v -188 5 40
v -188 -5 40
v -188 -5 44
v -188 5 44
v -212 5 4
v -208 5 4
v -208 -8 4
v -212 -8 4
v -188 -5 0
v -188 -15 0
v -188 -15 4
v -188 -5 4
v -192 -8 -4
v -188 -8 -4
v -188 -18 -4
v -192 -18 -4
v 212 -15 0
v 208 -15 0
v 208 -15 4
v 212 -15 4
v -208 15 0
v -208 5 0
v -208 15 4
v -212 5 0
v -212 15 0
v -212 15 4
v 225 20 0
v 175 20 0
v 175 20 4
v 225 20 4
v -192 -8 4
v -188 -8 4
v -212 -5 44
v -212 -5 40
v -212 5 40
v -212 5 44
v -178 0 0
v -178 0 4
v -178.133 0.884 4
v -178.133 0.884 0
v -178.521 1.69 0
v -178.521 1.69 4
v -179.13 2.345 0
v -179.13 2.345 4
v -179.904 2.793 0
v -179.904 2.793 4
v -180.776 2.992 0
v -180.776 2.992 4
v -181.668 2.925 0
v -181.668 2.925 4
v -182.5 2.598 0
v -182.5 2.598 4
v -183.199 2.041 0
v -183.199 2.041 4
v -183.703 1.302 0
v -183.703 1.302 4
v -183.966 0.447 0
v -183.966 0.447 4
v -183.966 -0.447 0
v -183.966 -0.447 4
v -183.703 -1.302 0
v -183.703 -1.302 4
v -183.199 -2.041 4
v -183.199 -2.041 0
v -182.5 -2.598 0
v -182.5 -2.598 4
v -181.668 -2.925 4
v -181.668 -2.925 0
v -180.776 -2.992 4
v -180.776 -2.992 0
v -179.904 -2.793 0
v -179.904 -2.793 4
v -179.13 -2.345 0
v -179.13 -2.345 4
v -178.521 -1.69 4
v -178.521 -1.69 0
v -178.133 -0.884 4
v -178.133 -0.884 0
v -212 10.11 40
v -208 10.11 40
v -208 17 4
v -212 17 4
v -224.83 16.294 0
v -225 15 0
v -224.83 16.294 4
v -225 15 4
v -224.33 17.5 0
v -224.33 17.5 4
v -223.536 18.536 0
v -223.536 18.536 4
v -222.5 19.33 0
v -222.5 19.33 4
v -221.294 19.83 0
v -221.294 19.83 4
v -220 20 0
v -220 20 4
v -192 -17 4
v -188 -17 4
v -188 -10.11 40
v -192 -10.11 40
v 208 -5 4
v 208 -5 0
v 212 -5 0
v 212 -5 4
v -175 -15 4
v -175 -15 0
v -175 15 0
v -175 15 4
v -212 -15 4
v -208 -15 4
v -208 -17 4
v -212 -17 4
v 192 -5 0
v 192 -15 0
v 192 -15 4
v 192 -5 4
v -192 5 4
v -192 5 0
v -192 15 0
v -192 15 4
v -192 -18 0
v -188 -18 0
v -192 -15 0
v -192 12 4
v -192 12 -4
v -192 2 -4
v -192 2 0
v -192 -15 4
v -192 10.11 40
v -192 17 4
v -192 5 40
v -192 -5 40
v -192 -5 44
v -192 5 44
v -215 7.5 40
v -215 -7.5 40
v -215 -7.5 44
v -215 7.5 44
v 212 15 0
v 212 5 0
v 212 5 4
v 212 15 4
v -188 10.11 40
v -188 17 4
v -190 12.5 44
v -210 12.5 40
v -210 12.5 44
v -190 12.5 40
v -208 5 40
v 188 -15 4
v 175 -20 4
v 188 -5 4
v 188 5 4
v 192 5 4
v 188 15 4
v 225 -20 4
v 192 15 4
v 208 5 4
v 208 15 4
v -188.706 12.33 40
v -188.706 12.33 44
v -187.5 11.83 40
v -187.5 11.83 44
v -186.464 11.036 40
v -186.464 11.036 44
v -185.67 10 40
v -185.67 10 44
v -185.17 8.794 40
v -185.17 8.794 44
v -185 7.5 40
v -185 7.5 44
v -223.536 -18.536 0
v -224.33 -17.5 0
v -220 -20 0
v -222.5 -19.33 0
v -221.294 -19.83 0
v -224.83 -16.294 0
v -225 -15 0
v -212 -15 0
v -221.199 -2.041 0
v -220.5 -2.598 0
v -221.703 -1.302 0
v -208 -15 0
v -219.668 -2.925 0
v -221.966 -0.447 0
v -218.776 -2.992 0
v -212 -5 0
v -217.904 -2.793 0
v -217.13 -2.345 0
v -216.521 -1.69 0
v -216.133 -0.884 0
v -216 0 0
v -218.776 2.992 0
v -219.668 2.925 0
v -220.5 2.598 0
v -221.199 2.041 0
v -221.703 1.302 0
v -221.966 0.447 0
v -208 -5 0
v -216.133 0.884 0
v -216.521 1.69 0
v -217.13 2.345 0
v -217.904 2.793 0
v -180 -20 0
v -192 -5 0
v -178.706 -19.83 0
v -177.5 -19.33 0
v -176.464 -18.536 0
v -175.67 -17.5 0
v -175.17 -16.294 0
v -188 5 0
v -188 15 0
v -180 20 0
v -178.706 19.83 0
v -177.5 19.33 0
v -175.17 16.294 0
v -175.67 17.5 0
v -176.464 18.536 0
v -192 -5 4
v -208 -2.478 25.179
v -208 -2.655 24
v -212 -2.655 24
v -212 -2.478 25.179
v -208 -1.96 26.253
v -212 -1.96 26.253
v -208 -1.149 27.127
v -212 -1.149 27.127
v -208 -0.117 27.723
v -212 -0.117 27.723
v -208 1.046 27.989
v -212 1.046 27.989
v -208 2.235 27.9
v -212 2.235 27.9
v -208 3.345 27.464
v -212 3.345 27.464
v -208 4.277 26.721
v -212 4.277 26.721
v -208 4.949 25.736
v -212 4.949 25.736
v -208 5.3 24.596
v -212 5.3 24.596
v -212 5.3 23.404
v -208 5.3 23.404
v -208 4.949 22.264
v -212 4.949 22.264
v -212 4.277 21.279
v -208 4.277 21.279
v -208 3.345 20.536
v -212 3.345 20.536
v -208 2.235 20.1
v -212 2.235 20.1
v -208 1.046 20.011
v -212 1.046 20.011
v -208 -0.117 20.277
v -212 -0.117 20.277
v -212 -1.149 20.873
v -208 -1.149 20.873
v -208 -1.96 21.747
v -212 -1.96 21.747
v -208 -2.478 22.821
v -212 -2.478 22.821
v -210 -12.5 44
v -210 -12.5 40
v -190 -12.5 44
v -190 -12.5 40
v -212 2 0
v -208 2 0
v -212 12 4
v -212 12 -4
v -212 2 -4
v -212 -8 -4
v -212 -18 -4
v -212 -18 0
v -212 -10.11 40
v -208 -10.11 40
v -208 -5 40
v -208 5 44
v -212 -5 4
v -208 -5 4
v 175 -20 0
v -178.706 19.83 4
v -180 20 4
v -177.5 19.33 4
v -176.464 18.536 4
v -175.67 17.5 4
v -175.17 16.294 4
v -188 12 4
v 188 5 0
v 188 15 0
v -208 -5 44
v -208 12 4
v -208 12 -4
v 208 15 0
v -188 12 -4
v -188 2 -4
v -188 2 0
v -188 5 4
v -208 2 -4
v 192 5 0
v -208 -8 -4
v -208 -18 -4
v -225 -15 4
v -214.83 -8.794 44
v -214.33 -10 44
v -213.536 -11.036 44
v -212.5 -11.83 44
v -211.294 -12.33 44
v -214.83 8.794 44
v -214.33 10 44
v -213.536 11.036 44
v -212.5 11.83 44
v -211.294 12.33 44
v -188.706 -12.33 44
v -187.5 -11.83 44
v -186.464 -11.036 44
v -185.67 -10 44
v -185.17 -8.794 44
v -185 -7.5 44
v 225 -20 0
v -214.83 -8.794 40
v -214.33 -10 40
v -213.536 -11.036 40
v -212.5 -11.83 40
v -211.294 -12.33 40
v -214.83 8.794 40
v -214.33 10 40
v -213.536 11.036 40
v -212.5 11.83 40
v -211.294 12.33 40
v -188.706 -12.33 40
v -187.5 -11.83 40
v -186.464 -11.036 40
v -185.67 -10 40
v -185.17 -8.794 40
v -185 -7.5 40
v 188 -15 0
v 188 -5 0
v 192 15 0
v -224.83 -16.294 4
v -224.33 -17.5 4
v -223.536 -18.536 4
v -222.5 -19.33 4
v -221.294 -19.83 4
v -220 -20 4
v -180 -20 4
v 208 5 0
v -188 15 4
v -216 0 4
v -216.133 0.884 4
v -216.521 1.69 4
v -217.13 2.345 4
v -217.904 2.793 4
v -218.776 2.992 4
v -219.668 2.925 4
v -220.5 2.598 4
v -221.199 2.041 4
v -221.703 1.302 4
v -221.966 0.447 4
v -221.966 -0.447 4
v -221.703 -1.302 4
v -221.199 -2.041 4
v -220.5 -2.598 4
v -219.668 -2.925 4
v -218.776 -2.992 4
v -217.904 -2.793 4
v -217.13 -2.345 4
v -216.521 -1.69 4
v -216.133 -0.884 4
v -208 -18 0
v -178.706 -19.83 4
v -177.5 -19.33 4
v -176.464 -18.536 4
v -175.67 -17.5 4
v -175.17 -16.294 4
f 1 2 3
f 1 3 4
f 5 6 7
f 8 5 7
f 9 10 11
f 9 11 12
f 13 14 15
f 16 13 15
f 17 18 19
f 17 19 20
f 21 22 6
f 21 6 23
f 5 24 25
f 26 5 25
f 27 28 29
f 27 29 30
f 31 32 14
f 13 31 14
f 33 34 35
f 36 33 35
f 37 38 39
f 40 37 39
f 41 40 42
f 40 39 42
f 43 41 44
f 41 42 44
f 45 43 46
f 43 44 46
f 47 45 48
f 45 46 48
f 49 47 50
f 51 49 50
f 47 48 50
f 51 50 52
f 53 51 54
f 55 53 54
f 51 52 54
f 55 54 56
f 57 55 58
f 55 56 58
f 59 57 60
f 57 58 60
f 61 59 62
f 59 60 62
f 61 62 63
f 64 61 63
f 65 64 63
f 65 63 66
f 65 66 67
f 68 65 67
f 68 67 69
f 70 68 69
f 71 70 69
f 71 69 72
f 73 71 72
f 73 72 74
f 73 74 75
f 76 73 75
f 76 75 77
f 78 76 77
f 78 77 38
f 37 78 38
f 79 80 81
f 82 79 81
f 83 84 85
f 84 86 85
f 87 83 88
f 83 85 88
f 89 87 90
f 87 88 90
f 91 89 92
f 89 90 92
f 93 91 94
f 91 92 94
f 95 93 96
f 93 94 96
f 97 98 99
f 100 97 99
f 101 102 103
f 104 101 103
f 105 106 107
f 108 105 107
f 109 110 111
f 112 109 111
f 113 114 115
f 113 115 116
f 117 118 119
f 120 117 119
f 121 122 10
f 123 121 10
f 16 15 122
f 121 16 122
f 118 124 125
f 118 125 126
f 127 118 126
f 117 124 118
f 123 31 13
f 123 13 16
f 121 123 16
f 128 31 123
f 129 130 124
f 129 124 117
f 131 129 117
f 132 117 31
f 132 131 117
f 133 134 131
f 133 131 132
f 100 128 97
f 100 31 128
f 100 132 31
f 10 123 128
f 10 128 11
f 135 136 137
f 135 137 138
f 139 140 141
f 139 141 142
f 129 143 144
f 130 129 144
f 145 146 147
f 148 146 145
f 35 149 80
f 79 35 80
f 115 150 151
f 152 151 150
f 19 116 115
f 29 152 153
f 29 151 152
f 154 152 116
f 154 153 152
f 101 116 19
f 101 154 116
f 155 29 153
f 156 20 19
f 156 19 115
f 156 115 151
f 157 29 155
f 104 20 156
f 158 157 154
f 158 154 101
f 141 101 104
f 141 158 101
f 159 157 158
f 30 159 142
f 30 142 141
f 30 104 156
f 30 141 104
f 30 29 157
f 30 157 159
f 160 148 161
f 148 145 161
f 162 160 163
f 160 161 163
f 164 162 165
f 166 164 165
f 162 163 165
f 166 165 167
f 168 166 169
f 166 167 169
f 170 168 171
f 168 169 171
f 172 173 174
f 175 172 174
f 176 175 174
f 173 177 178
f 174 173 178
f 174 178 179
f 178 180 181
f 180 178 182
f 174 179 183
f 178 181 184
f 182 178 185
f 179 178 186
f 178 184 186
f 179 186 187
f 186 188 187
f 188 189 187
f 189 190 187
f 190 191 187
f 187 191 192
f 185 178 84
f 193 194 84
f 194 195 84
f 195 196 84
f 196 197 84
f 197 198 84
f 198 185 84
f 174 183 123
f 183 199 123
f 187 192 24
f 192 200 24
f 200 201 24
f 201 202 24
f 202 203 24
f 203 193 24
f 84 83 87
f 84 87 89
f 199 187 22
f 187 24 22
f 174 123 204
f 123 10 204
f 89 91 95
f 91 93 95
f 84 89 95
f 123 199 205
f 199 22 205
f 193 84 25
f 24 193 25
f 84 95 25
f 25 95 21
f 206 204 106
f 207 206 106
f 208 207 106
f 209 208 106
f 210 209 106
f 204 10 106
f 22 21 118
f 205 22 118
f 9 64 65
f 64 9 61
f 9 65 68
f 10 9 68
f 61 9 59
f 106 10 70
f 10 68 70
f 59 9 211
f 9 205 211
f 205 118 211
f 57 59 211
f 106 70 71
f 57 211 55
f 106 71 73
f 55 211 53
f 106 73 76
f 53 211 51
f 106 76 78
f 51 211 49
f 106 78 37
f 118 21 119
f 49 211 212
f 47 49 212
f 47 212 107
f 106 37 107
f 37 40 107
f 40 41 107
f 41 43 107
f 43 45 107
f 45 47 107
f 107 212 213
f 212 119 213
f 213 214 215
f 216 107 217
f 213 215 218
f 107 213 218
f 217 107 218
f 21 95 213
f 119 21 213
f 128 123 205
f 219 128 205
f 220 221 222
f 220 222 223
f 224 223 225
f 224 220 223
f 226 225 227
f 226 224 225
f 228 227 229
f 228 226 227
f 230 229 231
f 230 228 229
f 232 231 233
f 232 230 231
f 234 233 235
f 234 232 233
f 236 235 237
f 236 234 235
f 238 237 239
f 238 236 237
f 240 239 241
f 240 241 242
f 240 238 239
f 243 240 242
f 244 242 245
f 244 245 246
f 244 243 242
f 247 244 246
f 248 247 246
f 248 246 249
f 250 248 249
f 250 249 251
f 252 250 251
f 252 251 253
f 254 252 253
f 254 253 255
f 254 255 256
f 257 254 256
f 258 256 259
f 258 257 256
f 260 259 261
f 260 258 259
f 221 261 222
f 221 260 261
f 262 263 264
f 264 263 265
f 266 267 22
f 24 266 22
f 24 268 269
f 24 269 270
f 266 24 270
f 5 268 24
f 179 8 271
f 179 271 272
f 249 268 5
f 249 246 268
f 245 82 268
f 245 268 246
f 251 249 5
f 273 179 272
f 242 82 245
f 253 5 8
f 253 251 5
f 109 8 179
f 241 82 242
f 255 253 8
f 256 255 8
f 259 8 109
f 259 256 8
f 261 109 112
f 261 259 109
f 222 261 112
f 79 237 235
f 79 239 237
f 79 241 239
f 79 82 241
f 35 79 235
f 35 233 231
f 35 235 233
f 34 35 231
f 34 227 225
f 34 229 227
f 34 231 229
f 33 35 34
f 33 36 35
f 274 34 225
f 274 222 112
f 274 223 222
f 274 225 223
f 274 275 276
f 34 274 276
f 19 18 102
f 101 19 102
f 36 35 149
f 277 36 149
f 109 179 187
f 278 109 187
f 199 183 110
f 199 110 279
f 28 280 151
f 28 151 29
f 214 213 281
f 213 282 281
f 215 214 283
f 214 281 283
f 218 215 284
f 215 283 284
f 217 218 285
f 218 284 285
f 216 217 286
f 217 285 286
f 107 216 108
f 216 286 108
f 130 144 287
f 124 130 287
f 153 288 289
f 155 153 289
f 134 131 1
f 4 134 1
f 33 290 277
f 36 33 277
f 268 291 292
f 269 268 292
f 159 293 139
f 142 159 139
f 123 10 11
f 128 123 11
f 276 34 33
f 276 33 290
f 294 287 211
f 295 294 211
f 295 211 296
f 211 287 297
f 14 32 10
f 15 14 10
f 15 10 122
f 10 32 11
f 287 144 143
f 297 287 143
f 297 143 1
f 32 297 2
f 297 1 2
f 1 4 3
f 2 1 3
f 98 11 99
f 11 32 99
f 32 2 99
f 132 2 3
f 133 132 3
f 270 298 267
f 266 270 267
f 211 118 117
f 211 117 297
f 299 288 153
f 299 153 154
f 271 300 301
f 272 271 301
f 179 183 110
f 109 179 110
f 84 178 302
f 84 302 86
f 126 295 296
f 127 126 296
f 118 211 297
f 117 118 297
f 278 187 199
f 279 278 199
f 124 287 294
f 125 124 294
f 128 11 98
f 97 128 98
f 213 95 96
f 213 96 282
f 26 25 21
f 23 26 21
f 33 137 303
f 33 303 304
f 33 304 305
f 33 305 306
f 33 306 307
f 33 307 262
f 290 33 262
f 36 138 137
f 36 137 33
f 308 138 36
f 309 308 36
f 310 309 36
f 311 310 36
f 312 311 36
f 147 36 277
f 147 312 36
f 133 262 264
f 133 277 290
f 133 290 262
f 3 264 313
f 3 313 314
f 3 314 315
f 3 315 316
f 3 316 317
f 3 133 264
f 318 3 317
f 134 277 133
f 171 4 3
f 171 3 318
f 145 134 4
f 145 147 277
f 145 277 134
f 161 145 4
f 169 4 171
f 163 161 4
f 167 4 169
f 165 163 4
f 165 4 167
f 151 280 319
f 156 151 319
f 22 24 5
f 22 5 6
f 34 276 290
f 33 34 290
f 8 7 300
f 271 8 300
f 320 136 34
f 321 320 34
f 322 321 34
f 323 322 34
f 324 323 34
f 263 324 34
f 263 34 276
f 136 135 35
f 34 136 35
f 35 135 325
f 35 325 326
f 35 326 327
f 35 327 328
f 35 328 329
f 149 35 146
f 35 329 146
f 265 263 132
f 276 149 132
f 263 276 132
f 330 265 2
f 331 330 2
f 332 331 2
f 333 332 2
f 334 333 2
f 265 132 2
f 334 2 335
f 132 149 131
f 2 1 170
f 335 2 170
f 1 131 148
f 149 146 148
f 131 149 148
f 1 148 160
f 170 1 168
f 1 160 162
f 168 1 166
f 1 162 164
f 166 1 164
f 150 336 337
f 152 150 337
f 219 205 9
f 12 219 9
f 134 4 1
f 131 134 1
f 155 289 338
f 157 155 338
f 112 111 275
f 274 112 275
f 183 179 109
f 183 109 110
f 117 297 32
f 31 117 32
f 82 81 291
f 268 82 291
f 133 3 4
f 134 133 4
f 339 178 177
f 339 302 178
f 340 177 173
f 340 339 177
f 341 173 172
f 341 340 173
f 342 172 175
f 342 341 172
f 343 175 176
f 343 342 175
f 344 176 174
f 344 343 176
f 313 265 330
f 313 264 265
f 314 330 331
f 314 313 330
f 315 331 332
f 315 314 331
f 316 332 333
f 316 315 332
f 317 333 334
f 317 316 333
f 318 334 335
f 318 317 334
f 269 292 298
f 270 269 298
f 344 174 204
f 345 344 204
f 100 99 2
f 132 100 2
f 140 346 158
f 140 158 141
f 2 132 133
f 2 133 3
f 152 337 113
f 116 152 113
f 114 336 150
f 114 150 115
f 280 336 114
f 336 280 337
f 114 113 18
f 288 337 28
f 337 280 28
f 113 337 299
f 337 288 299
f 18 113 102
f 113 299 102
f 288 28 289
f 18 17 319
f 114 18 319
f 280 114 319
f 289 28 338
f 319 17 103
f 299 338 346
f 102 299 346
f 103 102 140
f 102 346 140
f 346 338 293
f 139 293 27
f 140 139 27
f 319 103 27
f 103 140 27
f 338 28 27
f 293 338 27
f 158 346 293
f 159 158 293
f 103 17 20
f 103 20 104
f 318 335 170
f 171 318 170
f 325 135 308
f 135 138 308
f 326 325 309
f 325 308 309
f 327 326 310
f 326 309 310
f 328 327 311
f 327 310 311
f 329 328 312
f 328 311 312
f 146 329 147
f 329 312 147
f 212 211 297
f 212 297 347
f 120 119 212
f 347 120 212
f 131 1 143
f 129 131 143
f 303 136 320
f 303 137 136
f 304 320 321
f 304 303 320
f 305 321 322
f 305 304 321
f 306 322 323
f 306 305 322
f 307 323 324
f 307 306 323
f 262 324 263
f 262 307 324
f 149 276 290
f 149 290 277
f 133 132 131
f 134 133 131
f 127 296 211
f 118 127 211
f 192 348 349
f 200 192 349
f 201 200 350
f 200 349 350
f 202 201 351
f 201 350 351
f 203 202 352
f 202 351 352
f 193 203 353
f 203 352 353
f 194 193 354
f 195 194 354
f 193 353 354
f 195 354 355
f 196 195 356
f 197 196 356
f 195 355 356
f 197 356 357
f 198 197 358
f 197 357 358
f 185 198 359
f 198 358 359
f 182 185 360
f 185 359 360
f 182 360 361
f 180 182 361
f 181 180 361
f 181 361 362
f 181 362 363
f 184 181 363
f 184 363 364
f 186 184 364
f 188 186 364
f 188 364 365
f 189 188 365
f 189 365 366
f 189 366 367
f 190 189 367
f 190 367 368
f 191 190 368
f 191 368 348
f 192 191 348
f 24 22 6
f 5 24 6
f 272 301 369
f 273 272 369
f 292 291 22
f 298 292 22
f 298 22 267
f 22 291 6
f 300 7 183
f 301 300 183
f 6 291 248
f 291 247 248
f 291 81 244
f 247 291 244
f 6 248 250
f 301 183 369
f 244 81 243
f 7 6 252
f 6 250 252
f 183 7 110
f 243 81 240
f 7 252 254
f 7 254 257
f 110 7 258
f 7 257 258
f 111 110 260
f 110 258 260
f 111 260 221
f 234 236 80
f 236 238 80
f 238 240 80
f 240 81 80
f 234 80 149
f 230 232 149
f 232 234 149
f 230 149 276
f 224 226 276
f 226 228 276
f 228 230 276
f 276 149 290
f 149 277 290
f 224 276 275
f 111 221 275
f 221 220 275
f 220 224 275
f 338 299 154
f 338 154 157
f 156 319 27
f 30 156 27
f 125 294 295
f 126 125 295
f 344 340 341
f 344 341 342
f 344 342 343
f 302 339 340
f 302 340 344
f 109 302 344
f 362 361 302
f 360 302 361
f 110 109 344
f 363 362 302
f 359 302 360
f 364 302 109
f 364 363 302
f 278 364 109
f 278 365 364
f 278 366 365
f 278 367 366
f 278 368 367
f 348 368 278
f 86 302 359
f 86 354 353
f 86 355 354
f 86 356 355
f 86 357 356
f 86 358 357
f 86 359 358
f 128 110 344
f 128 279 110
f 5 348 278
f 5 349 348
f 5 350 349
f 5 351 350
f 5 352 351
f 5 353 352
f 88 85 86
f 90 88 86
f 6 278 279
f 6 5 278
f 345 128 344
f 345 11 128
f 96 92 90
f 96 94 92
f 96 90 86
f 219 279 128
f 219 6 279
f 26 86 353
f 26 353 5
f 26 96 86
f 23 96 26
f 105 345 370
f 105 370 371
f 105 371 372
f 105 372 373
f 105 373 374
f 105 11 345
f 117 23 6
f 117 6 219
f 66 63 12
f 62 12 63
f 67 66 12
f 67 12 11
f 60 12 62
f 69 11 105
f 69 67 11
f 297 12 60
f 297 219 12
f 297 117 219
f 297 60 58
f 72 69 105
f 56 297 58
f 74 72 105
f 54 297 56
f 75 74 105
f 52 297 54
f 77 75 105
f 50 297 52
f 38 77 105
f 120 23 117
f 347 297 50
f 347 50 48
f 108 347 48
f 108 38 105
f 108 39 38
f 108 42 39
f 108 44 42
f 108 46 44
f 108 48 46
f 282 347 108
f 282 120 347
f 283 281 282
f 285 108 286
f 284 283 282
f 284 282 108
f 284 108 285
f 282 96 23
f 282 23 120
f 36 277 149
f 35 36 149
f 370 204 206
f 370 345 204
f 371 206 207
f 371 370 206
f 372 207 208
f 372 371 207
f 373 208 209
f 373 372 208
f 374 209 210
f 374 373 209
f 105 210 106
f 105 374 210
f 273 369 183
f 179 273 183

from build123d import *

# Parameters (mm, degrees)
F1_W      = 50
F1_H      = 40
F1_W_2    = 4
F1_H_2    = 10
F2_DEPTH  = 4
F3_R      = 5
F4_R      = 4
F5_DEPTH  = 4
F7_DEPTH  = 4
F8_W      = 30
F8_H      = 25
F8_W_2    = 4
F8_H_2    = 10
F9_DEPTH  = 4
F10_R     = 5
F11_R     = 3
F12_DEPTH = 25


with BuildPart() as f2:
    # F1 (on Top) → F2 (new body)
    with BuildSketch(Plane.XY):
        with Locations((-200, 0)):
            Rectangle(F1_W, F1_H)
        with Locations((-210, -10)):
            Rectangle(F1_W_2, F1_H_2, mode=Mode.SUBTRACT)
        with Locations((-190, -10)):
            Rectangle(F1_W_2, F1_H_2, mode=Mode.SUBTRACT)
        with Locations((-210, 10)):
            Rectangle(F1_W_2, F1_H_2, mode=Mode.SUBTRACT)
        with Locations((-190, 10)):
            Rectangle(F1_W_2, F1_H_2, mode=Mode.SUBTRACT)
        with Locations((200, 0)):
            Rectangle(F1_W, F1_H)
        with Locations((190, -10)):
            Rectangle(F1_W_2, F1_H_2, mode=Mode.SUBTRACT)
        with Locations((210, -10)):
            Rectangle(F1_W_2, F1_H_2, mode=Mode.SUBTRACT)
        with Locations((190, 10)):
            Rectangle(F1_W_2, F1_H_2, mode=Mode.SUBTRACT)
        with Locations((210, 10)):
            Rectangle(F1_W_2, F1_H_2, mode=Mode.SUBTRACT)
    extrude(amount=F2_DEPTH)

    # F3
    f3_edges = [f2.edges().sort_by_distance(p)[0] for p in [
        (-175, 20, 2),
        (-225, 20, 2),
        (-175, -20, 2),
        (-225, -20, 2),
    ]]
    fillet(f3_edges, radius=F3_R)

    # F11 (on face) → F12 (cut)
    with BuildSketch(Plane.XY.offset(4)):
        with Locations((-219, 0)):
            Circle(F11_R)
        with Locations((-181, 0)):
            Circle(F11_R)
    extrude(amount=-F12_DEPTH, mode=Mode.SUBTRACT)


with BuildPart() as f5:
    # F4 (on face) → F5 (new body)
    with BuildSketch(Plane(origin=(-208, 0, 0), x_dir=(0, -1, 0), z_dir=(-1, 0, 0))):
        Polygon((5, 44), (-5, 44), (-5, 40), (-10.110191, 40), (-17, 4), (-15, 4), (-12, 4), (-5, 4), (8, 4), (8, -4), (18, -4), (18, 0), (15, 0), (15, 4), (17, 4), (10.110191, 40), (5, 40), align=None)
        with Locations((-1.344657, 24)):
            Circle(F4_R, mode=Mode.SUBTRACT)
        Polygon((-5, 4), (-12, 4), (-12, -4), (-2, -4), (-2, 0), (-5, 0), align=None)
    extrude(amount=F5_DEPTH)


with BuildPart() as f7:
    # F6 (on face) → F7 (new body)
    with BuildSketch(Plane(origin=(-188, 0, 0), x_dir=(0, -1, 0), z_dir=(-1, 0, 0))):
        Polygon((-10.110191, 40), (-17, 4), (-12, 4), (-12, -4), (-2, -4), (-2, 0), (-5, 0), (-5, 4), (8, 4), (8, -4), (18, -4), (18, 0), (15, 0), (15, 4), (17, 4), (10.110191, 40), (5, 40), (5, 44), (-5, 44), (-5, 40), align=None)
    extrude(amount=F7_DEPTH)


with BuildPart() as f9:
    # F8 (on face) → F9 (new body)
    with BuildSketch(Plane.XY.offset(40)):
        with Locations((-200, 0)):
            Rectangle(F8_W, F8_H)
        with Locations((-210, 0)):
            Rectangle(F8_W_2, F8_H_2, mode=Mode.SUBTRACT)
        with Locations((-190, 0)):
            Rectangle(F8_W_2, F8_H_2, mode=Mode.SUBTRACT)
    extrude(amount=F9_DEPTH)

    # F10
    f10_edges = [f9.edges().sort_by_distance(p)[0] for p in [
        (-215, -12.5, 42),
        (-185, -12.5, 42),
        (-185, 12.5, 42),
        (-215, 12.5, 42),
    ]]
    fillet(f10_edges, radius=F10_R)


solid = Compound([f2.part, f5.part, f7.part, f9.part])
